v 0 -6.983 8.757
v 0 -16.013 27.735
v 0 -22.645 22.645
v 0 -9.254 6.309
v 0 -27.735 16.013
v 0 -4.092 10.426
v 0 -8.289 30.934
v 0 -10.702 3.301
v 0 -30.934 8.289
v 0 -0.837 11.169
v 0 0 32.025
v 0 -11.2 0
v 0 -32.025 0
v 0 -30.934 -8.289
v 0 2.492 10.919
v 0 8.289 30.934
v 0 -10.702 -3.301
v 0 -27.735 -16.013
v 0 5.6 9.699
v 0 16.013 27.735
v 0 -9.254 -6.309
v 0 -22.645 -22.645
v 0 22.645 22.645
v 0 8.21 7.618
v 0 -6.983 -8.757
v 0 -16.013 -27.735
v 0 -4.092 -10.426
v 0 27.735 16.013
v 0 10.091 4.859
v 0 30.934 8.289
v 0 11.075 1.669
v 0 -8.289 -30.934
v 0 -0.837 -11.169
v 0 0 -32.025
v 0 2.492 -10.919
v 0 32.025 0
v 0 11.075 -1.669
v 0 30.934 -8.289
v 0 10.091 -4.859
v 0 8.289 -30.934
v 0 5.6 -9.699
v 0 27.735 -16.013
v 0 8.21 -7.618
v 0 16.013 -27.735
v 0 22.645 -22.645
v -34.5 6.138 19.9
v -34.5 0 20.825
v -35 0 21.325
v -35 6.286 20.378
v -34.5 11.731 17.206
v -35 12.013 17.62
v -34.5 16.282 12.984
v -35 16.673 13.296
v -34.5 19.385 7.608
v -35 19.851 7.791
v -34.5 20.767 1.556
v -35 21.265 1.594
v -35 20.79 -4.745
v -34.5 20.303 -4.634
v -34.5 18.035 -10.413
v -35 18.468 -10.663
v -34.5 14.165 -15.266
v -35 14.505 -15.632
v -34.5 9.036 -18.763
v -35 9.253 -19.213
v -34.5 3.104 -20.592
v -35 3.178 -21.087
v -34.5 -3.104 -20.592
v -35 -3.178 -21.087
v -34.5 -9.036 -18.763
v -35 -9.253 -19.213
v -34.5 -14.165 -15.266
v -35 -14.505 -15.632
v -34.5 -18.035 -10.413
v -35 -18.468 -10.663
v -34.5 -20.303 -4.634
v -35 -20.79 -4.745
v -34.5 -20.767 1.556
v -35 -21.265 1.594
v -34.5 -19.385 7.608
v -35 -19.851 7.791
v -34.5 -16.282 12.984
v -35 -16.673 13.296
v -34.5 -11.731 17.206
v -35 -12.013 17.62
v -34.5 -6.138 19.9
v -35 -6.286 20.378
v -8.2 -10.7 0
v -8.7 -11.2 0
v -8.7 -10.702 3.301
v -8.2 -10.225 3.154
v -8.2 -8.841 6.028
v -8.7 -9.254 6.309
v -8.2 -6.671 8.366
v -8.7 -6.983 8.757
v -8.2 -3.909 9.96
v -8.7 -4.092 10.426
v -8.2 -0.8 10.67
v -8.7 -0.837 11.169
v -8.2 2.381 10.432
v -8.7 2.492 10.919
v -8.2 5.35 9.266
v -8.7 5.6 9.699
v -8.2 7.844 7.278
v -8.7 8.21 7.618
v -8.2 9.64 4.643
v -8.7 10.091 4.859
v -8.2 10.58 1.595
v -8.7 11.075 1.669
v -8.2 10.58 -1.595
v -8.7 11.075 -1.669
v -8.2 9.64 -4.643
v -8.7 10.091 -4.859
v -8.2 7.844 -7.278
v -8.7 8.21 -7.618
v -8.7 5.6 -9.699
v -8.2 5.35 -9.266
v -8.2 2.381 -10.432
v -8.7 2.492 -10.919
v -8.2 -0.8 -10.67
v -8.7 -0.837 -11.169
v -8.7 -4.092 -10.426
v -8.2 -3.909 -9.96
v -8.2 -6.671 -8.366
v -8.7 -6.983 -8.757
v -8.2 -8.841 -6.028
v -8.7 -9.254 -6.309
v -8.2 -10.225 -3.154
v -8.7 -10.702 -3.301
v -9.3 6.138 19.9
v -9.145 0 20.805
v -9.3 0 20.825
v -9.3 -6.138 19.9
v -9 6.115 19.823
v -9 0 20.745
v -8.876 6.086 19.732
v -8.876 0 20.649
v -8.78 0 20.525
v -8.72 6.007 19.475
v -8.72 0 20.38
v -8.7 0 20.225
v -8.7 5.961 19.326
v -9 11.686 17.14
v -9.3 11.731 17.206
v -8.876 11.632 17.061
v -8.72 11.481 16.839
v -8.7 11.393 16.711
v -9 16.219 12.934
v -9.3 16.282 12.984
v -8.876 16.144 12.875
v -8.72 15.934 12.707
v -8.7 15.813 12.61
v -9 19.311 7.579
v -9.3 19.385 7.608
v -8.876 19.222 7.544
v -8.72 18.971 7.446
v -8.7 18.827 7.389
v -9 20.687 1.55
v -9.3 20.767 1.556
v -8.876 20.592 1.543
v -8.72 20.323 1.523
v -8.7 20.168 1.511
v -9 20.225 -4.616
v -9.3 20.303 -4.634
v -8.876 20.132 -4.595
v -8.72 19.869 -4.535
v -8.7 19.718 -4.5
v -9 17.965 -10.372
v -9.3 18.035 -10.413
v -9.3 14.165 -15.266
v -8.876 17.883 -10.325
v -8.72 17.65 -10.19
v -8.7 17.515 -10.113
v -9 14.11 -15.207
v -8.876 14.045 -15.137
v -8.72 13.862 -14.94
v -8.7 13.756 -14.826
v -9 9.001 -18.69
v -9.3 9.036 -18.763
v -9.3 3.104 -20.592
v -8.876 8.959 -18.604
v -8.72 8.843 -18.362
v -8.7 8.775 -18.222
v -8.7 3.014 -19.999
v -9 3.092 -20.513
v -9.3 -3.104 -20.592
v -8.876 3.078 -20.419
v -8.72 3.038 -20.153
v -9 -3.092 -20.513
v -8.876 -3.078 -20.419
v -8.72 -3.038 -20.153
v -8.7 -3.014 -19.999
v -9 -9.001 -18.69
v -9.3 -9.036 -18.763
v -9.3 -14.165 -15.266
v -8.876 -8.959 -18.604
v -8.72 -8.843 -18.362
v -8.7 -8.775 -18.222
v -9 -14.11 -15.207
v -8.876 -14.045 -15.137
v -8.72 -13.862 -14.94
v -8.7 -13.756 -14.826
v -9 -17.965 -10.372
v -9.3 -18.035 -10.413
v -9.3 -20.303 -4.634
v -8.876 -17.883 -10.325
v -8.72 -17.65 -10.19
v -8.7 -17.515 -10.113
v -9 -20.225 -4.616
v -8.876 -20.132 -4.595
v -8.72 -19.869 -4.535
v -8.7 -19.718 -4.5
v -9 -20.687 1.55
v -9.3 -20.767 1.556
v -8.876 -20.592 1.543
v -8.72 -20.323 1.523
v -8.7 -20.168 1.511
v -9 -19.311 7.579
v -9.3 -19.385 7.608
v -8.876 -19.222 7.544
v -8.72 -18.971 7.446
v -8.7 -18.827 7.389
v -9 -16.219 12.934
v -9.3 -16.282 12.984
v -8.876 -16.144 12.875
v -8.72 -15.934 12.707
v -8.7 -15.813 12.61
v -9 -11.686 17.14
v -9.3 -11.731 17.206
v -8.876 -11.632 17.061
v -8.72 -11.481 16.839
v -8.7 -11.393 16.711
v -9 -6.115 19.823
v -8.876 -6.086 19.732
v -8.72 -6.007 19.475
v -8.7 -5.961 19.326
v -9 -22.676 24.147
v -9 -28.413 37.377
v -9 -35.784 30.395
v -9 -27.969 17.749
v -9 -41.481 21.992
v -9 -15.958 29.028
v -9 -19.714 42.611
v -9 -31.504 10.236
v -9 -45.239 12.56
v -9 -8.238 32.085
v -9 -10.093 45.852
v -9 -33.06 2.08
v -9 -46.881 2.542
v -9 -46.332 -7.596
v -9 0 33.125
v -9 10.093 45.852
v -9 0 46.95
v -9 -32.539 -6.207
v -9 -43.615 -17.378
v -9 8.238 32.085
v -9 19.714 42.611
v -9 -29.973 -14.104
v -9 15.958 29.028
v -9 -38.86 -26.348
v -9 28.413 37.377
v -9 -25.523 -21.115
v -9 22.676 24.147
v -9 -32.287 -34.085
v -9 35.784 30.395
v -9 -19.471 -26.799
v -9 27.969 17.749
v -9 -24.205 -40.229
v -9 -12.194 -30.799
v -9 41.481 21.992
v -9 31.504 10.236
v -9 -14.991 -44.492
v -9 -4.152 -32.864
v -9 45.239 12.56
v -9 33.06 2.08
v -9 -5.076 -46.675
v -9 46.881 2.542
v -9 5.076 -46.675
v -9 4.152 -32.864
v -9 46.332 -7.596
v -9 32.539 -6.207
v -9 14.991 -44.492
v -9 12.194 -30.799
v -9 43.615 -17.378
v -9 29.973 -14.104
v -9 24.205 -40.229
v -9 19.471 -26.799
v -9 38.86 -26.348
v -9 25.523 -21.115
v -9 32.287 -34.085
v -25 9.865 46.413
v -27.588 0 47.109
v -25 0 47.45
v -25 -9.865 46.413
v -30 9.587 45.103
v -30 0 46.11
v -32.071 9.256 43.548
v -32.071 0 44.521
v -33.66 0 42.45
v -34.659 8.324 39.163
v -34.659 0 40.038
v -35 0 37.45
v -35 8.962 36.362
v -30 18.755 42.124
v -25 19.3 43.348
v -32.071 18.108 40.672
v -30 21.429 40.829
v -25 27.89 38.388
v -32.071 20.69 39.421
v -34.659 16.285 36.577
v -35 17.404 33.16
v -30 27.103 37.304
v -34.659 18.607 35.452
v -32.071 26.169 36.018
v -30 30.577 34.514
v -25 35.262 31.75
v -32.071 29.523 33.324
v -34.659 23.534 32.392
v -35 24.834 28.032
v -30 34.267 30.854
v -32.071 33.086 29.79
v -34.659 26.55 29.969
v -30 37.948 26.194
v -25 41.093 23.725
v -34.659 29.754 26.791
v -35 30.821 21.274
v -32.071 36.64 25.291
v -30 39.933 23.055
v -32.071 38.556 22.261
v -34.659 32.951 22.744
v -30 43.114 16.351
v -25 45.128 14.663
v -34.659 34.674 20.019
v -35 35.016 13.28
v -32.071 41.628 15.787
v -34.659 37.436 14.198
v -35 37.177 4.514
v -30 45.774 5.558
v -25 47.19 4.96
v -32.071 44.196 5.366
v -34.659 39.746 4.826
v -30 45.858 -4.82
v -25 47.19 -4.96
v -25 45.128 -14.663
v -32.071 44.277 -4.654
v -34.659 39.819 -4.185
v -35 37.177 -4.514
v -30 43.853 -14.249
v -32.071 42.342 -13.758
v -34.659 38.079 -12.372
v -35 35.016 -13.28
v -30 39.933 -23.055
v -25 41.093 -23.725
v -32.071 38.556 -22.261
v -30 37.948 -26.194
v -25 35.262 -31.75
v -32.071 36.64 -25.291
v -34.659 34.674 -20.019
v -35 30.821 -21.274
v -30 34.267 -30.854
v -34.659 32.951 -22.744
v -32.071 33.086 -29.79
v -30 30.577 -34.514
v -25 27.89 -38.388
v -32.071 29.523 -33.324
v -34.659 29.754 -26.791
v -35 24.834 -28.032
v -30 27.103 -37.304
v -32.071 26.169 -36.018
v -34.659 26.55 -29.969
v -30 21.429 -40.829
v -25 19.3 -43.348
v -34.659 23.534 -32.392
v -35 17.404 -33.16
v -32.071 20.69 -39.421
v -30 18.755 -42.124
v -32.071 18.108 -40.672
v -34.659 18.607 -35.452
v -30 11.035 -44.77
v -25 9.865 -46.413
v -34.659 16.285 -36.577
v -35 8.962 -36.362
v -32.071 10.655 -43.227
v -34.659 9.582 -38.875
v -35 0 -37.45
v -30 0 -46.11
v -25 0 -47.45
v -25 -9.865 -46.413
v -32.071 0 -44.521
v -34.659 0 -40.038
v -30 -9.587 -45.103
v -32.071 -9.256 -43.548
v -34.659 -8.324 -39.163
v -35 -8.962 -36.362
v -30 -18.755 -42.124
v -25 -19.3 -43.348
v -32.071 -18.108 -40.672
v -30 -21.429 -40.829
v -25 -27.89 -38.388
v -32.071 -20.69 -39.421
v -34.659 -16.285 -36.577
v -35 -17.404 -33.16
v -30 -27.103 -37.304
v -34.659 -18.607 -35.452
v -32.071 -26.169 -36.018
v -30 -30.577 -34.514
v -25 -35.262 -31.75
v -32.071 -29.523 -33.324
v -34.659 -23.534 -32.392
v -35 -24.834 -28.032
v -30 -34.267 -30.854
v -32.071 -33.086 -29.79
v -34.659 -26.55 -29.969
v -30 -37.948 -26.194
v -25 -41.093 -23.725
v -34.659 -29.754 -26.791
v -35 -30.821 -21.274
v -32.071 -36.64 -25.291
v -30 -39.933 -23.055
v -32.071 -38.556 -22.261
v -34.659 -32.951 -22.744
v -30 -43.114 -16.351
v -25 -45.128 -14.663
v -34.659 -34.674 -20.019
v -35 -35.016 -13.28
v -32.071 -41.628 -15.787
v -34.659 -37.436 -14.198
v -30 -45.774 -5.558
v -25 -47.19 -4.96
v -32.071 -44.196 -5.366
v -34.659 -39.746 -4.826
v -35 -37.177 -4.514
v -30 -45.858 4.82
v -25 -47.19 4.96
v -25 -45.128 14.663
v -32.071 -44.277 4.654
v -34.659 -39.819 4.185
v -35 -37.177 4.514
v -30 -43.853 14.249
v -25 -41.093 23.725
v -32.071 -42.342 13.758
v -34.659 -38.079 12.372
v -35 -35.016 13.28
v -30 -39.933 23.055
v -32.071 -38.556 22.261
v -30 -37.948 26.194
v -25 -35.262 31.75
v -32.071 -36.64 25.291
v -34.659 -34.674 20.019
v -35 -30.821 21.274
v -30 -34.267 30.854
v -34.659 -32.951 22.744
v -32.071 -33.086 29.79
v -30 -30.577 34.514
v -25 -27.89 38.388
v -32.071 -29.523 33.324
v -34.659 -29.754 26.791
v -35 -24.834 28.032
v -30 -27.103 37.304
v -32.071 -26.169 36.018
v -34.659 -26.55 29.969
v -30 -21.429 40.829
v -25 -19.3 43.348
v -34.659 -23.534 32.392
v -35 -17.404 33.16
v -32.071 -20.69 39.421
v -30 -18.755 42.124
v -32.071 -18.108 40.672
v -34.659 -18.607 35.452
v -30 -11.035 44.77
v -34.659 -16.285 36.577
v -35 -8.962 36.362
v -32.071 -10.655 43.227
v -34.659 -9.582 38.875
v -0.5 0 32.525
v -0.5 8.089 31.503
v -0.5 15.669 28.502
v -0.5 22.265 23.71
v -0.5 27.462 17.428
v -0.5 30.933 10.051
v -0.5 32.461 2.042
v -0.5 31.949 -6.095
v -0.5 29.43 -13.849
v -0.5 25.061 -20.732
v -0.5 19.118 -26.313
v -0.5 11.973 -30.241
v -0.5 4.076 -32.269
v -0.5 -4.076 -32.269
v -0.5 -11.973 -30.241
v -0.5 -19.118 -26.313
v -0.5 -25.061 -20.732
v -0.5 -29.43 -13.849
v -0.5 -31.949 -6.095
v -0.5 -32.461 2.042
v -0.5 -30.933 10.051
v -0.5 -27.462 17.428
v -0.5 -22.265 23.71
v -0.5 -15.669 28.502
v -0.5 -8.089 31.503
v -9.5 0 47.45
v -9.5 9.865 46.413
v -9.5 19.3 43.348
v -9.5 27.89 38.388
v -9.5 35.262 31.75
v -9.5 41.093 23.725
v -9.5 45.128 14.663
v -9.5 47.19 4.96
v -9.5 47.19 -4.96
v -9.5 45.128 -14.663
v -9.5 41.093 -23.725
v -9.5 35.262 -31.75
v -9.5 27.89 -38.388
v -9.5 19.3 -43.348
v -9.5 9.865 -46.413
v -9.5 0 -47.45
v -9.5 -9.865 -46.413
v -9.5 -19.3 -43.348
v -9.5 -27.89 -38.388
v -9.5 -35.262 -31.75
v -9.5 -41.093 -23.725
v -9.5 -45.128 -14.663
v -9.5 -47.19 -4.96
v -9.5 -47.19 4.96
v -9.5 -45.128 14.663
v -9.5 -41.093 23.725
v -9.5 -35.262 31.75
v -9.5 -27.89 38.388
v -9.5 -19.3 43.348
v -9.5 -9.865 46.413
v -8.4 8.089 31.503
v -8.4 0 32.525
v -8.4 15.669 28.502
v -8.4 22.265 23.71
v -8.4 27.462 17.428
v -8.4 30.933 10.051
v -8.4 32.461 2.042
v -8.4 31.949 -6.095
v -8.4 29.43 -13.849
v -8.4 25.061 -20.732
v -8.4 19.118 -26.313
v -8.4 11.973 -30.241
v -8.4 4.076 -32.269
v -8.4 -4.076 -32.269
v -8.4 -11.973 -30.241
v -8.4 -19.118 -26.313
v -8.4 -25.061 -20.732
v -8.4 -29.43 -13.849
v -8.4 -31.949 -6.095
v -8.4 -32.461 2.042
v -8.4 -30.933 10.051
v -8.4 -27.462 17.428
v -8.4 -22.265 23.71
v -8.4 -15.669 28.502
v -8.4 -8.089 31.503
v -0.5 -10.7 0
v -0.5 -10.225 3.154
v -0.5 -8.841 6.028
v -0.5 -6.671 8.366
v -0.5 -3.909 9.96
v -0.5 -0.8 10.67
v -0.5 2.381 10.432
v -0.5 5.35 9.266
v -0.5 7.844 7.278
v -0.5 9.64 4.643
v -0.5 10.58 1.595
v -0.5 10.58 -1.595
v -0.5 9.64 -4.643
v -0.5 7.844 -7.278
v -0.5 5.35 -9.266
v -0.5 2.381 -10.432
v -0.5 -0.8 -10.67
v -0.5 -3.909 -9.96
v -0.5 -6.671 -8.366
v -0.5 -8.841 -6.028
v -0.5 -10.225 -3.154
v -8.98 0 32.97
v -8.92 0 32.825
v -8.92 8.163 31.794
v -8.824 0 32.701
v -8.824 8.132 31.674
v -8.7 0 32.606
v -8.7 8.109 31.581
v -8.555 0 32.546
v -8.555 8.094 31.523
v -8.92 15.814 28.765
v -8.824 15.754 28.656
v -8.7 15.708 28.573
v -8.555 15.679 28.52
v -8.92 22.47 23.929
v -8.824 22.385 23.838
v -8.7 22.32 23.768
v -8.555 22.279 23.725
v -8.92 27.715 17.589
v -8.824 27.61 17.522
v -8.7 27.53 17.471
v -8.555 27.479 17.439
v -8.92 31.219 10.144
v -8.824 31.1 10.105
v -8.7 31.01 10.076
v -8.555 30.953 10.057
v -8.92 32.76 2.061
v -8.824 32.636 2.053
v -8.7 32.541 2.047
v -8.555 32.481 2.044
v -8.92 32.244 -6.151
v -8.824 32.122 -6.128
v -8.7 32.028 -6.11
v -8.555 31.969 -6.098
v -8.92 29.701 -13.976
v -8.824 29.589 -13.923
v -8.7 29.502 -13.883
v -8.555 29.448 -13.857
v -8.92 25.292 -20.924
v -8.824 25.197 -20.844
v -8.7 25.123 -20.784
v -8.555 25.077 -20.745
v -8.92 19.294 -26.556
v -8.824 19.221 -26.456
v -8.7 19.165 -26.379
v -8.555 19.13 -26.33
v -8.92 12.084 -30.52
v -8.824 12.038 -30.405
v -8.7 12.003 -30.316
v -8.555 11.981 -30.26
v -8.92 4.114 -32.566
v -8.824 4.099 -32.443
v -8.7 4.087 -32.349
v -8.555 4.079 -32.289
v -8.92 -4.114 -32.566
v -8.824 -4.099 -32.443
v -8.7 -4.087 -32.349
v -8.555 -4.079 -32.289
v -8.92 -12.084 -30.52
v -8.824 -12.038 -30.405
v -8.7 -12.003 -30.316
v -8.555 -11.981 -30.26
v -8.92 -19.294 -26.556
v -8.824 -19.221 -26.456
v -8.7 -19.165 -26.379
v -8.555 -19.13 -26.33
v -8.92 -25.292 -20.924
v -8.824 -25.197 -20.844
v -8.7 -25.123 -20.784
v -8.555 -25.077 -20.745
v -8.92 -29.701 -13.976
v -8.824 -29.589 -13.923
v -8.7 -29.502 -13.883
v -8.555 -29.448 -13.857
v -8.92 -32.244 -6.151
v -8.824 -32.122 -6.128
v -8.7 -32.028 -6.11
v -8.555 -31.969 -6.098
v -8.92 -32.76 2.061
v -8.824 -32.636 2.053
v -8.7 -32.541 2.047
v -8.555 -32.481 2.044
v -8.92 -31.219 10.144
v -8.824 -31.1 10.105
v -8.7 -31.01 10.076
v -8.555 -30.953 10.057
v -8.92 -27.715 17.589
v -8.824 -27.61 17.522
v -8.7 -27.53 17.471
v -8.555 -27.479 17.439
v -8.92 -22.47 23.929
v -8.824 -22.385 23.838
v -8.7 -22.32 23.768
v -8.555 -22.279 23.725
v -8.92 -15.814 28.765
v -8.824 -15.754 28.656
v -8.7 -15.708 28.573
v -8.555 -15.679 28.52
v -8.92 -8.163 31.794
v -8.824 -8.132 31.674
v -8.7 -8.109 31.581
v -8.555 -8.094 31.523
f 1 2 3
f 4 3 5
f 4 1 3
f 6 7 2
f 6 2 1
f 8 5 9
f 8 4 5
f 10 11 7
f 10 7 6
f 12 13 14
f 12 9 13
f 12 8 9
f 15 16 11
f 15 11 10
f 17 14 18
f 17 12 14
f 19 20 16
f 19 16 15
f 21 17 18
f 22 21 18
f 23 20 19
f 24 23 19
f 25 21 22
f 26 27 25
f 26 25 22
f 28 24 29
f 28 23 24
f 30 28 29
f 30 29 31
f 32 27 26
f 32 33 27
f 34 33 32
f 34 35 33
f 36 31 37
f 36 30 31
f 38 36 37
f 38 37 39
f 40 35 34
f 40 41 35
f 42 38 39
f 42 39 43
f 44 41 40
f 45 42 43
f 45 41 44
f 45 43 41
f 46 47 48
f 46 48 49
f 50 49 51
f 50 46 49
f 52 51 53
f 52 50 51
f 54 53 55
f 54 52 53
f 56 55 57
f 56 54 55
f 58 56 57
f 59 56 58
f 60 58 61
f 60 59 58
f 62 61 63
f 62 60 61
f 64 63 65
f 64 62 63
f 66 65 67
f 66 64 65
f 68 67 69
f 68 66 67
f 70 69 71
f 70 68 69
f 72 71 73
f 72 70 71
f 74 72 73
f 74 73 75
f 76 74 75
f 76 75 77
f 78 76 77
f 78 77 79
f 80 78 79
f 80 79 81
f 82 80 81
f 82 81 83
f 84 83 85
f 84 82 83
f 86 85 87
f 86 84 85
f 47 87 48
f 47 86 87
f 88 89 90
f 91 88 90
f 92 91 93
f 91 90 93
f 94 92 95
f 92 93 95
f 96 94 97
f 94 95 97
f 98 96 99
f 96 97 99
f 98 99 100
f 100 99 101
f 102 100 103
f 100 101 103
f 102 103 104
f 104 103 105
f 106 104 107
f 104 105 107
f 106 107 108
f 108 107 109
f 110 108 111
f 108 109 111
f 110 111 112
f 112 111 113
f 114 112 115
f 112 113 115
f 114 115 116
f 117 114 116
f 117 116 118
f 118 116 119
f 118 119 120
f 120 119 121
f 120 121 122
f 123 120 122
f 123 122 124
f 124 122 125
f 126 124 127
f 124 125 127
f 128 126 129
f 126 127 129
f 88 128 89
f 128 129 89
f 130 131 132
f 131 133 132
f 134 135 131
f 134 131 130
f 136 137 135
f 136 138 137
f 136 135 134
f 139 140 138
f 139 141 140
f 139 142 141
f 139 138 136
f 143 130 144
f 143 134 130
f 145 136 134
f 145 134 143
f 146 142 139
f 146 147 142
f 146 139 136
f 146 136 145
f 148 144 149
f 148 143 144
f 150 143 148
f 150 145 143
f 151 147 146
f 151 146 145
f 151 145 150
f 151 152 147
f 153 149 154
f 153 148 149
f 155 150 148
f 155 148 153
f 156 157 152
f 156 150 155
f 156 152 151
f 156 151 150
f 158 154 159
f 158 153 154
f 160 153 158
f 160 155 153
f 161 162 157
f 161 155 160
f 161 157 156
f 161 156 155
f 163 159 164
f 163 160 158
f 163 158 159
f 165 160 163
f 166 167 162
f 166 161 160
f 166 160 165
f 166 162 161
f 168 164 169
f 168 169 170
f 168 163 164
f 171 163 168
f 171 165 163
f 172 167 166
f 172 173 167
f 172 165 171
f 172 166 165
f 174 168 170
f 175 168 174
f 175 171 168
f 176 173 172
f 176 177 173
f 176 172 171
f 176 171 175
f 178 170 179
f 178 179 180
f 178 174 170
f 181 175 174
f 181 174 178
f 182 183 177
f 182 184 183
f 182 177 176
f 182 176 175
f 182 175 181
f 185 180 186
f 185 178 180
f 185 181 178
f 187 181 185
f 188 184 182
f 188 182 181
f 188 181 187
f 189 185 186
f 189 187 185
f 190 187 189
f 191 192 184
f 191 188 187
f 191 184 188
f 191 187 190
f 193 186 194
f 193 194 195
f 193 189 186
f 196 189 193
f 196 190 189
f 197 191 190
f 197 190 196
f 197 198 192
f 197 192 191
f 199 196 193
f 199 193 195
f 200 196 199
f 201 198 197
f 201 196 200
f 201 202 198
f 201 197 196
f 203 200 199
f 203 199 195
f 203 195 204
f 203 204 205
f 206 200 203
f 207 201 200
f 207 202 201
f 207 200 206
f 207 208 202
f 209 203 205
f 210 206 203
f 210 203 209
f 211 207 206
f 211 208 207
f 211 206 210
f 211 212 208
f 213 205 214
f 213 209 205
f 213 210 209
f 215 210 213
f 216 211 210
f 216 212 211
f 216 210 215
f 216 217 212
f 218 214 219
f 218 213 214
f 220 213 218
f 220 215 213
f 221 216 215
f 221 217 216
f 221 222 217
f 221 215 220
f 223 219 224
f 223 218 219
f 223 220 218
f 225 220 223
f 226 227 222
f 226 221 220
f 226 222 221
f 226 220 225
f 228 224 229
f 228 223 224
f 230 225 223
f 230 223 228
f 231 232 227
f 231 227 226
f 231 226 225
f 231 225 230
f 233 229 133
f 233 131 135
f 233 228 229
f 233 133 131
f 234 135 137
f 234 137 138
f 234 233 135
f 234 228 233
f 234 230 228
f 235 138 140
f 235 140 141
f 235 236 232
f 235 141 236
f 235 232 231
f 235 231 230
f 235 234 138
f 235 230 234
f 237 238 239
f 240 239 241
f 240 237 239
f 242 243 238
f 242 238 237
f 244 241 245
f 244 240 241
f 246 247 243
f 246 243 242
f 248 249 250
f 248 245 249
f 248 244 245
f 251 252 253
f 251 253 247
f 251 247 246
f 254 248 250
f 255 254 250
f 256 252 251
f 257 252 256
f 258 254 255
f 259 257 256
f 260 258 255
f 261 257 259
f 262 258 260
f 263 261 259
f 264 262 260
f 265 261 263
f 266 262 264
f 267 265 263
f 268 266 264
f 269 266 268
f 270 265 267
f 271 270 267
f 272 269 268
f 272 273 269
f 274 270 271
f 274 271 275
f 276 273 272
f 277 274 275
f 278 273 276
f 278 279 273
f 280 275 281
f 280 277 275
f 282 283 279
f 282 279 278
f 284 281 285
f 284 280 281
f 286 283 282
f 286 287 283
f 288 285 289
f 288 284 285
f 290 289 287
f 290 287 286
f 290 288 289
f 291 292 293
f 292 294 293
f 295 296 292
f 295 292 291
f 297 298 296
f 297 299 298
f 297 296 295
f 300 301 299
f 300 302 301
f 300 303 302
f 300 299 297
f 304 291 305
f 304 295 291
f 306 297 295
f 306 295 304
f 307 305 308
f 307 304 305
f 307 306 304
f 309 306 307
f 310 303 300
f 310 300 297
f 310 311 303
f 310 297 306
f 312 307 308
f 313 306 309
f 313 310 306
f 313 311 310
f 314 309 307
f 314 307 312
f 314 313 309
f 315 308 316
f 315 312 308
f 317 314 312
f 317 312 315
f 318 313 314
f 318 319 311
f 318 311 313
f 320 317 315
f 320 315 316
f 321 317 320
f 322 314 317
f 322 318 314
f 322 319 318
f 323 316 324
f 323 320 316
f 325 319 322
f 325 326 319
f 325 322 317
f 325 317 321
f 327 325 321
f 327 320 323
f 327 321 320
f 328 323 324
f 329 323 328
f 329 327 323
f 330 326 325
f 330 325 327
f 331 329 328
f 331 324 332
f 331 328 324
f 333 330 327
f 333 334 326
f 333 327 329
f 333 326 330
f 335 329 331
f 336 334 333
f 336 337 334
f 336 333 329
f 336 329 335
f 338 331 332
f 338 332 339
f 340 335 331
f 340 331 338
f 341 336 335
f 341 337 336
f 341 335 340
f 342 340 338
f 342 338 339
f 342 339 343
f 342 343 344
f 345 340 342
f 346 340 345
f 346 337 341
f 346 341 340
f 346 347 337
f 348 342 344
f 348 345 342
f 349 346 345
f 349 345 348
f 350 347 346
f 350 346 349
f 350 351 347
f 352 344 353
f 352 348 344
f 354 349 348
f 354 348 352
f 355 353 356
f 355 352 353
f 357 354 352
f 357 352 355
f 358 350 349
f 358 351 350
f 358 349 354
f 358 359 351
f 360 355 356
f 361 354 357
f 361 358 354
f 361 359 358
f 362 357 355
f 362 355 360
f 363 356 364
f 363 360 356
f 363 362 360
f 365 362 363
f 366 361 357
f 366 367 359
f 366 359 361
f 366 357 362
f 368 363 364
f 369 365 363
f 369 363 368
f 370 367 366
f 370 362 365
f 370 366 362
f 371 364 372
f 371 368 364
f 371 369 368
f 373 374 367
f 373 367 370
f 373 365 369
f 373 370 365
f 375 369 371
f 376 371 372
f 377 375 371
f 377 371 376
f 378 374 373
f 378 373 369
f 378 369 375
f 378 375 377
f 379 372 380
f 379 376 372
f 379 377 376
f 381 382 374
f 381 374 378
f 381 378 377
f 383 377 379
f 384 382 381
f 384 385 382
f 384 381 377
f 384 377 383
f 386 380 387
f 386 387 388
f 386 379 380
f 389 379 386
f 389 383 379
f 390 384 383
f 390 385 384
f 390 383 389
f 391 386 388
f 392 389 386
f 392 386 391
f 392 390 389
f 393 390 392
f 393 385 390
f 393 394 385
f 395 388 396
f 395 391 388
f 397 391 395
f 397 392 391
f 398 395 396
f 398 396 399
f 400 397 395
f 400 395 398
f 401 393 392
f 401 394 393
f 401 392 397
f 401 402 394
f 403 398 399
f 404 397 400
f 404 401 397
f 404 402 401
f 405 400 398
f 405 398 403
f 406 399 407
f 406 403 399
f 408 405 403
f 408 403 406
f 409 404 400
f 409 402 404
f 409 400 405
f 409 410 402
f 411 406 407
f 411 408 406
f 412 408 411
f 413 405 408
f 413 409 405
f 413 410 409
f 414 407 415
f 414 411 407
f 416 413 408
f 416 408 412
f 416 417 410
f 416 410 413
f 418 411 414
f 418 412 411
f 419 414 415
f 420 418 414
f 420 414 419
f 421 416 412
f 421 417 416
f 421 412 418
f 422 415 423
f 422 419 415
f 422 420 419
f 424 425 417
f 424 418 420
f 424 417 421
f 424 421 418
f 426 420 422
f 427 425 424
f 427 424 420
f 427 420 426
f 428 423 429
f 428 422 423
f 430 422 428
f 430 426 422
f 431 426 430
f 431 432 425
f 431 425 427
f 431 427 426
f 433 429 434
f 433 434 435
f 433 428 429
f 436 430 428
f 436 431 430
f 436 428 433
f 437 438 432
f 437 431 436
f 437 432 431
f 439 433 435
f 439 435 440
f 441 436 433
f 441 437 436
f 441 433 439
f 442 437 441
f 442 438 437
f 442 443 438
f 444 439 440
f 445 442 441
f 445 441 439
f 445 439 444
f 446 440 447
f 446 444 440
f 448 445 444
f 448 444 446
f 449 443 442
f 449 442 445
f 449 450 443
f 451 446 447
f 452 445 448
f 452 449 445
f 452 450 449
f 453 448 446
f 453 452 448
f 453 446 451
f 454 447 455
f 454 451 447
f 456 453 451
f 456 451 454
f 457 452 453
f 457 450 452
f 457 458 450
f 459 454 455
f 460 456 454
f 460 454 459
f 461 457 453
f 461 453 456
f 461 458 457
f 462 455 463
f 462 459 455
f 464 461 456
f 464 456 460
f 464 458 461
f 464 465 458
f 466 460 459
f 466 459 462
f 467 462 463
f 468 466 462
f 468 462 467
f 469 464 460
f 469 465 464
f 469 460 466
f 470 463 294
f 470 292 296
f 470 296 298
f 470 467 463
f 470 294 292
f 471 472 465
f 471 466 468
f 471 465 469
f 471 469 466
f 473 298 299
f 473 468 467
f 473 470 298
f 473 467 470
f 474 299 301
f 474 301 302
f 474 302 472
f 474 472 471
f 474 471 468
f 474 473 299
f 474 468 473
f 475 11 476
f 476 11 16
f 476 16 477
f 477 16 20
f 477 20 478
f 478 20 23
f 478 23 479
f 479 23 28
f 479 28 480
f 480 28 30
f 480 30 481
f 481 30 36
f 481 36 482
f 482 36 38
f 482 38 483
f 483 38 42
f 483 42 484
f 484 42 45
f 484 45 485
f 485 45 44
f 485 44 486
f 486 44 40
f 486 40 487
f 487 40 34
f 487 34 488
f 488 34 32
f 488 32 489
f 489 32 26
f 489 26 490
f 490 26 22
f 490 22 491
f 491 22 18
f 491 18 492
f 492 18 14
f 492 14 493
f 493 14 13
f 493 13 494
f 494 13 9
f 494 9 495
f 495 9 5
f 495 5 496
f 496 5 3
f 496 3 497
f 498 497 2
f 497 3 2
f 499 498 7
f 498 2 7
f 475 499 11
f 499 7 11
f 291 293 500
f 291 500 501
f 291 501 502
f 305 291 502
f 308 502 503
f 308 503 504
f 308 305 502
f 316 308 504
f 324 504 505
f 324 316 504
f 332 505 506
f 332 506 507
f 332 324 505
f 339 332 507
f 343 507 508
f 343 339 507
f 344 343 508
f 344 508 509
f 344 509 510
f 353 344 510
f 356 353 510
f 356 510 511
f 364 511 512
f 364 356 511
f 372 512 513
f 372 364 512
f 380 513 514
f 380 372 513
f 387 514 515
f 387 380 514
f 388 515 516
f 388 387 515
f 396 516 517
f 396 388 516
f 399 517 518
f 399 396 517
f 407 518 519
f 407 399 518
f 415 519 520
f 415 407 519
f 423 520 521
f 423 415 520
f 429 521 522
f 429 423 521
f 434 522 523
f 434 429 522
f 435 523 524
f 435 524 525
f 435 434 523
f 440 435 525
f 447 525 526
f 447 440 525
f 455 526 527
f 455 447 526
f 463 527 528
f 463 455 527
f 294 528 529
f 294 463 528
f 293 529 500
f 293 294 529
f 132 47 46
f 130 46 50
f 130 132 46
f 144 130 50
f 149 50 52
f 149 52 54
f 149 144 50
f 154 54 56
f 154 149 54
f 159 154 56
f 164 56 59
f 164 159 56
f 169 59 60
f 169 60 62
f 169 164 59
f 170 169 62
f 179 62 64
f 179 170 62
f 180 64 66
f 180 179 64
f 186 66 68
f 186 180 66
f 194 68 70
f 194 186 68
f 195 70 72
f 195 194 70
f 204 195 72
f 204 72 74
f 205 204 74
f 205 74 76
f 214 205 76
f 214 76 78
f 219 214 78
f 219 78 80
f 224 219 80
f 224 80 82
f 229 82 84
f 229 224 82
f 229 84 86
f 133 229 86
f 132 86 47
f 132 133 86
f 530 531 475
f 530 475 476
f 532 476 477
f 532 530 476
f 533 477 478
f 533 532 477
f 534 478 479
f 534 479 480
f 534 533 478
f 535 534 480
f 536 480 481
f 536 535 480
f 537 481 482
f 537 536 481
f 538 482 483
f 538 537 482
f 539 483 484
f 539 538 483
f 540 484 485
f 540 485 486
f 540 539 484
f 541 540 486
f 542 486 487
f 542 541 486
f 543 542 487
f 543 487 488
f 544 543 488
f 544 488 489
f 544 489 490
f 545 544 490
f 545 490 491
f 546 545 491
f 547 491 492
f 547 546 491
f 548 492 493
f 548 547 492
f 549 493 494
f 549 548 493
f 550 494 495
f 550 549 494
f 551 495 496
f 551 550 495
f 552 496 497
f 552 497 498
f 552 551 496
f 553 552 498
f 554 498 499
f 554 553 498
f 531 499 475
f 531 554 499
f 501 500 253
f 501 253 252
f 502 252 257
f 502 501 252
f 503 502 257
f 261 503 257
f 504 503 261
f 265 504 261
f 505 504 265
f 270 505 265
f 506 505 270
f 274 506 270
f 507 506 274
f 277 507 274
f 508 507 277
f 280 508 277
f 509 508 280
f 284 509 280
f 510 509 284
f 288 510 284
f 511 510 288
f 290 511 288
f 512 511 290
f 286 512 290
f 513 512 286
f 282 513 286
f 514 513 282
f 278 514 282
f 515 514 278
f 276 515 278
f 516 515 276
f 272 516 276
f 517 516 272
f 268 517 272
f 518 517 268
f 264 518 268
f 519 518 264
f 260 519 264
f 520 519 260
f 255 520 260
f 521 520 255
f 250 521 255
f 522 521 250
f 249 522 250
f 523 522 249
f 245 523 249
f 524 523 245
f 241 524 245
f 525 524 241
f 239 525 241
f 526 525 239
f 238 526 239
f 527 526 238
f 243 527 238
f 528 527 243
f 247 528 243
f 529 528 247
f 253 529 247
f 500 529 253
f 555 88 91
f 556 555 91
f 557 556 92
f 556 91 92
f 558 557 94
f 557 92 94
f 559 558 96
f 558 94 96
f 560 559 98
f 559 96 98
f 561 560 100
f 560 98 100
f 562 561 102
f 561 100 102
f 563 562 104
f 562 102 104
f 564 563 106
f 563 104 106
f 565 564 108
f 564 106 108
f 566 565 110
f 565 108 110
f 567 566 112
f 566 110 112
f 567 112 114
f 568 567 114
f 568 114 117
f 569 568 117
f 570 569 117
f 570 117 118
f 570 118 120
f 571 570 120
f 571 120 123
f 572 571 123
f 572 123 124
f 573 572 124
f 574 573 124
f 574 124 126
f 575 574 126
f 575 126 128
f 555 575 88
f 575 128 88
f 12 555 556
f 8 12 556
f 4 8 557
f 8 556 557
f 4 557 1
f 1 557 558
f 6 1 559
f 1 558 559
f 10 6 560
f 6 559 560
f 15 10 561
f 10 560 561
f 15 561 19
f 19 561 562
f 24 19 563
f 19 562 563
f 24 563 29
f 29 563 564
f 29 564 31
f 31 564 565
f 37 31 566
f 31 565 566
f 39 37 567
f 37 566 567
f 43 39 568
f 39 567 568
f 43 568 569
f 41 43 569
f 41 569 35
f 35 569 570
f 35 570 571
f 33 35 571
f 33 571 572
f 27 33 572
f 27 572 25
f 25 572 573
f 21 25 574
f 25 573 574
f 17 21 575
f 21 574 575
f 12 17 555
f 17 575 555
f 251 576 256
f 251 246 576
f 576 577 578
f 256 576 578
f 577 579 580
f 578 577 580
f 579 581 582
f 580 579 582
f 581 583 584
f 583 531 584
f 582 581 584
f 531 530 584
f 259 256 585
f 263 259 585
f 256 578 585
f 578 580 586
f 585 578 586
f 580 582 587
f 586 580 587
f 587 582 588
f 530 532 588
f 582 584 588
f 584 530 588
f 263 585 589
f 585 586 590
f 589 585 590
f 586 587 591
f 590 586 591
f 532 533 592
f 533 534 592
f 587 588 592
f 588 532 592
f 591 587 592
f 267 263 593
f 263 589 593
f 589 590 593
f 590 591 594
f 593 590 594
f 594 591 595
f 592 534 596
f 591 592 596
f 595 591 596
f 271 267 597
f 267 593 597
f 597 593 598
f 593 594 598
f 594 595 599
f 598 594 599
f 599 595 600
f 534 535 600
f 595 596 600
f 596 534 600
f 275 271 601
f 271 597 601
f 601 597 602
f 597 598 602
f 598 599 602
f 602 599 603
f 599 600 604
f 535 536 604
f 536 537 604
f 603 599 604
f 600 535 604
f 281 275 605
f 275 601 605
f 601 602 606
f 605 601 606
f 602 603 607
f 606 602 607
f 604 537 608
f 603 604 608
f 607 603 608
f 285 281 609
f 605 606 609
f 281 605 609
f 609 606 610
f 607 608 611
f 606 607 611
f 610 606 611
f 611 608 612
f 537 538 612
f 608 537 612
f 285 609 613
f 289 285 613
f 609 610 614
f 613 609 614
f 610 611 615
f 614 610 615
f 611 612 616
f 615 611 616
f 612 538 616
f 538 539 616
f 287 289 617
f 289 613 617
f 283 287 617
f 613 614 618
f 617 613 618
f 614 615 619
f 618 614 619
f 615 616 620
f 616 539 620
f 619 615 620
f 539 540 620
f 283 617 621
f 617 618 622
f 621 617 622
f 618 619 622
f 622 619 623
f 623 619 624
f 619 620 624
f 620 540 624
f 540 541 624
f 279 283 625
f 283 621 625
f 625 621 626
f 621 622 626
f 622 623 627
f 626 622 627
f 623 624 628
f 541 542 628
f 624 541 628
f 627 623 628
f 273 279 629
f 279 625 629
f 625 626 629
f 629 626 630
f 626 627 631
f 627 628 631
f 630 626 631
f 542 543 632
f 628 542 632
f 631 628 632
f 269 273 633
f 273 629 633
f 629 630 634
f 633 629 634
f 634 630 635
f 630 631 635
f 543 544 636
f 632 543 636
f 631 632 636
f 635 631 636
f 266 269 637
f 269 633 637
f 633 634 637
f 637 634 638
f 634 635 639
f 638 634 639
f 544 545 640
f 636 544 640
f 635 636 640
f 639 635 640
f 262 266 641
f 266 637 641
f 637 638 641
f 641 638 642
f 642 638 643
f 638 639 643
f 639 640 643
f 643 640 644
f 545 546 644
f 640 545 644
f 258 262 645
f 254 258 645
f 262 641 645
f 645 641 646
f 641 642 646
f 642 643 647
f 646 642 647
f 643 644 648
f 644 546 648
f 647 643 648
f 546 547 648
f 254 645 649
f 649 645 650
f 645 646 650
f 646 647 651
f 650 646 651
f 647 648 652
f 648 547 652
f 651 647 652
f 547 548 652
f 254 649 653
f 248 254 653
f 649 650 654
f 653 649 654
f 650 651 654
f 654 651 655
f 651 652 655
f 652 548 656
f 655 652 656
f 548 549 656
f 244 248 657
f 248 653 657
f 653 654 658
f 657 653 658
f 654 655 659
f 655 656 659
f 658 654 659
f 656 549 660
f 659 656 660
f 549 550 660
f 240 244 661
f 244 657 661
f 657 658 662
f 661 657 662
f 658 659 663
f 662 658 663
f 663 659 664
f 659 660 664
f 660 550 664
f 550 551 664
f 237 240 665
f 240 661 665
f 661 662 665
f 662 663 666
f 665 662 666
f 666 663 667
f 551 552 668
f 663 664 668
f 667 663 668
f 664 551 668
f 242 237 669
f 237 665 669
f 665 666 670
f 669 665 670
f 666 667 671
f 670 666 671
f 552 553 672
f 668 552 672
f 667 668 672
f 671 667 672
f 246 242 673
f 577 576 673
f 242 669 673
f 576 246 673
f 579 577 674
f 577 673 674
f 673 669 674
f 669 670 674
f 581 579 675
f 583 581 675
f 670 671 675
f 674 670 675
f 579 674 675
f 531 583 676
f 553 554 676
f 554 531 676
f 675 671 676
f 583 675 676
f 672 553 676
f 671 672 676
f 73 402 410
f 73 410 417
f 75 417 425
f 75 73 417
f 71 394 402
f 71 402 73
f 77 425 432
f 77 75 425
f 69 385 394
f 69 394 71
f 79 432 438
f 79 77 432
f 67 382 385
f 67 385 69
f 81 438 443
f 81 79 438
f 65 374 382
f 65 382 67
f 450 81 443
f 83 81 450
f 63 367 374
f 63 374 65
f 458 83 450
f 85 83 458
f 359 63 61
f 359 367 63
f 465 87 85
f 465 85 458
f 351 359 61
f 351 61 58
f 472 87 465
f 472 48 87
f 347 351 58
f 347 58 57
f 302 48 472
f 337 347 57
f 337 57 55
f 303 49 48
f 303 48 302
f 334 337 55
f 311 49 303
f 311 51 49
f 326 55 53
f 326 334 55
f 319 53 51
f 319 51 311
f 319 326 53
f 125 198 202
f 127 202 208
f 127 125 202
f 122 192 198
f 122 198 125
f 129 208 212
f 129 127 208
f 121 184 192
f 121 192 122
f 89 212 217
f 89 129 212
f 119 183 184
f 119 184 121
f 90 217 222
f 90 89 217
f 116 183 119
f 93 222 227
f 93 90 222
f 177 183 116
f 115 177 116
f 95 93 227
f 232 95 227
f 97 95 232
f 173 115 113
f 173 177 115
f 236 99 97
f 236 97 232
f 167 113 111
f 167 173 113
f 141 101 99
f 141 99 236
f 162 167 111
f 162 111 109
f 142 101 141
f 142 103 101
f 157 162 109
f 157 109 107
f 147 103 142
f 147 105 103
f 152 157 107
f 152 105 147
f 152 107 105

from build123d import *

# Parameters (mm, degrees)
F2_R     = 10
F3_R     = 10.7
F4_DEPTH = 8.7
F5_R     = 0.6
F6_SIZE  = 0.5


with BuildPart() as f1:
    # F0 (on Front) → F1 (revolve)
    with BuildSketch(Plane.XZ):
        Polygon((-8.7, 0), (0, 0), (0, 32.525253), (-9, 32.525253), (-9, 47.45), (-35, 47.45), (-35, 20.825), (-8.7, 20.825), align=None)
    revolve(axis=Axis((-4.35, 0, 0), (-1, 0, 0)))

    # F2
    f2_edges = [f1.edges().sort_by_distance(p)[0] for p in [
        (-35, 0, -47.45),
    ]]
    fillet(f2_edges, radius=F2_R)

    # F3 (on face) → F4 (cut, through all)
    with BuildSketch(Plane(origin=(-8.7, 0, 0), x_dir=(0, -1, 0), z_dir=(-1, 0, 0))):
        Circle(F3_R)
    extrude(amount=-F4_DEPTH, mode=Mode.SUBTRACT)

    # F5
    f5_edges = [f1.edges().sort_by_distance(p)[0] for p in [
        (-8.7, 0, -20.825),
        (-9, 0, -32.525253),
    ]]
    fillet(f5_edges, radius=F5_R)

    # F6
    f6_edges = [f1.edges().sort_by_distance(p)[0] for p in [
        (-9, 0, -47.45),
        (0, 0, -32.525253),
        (0, 10.7, 0),
        (-8.7, 10.7, 0),
        (-35, 0, -20.825),
    ]]
    chamfer(f6_edges, length=F6_SIZE)


solid = f1.part
